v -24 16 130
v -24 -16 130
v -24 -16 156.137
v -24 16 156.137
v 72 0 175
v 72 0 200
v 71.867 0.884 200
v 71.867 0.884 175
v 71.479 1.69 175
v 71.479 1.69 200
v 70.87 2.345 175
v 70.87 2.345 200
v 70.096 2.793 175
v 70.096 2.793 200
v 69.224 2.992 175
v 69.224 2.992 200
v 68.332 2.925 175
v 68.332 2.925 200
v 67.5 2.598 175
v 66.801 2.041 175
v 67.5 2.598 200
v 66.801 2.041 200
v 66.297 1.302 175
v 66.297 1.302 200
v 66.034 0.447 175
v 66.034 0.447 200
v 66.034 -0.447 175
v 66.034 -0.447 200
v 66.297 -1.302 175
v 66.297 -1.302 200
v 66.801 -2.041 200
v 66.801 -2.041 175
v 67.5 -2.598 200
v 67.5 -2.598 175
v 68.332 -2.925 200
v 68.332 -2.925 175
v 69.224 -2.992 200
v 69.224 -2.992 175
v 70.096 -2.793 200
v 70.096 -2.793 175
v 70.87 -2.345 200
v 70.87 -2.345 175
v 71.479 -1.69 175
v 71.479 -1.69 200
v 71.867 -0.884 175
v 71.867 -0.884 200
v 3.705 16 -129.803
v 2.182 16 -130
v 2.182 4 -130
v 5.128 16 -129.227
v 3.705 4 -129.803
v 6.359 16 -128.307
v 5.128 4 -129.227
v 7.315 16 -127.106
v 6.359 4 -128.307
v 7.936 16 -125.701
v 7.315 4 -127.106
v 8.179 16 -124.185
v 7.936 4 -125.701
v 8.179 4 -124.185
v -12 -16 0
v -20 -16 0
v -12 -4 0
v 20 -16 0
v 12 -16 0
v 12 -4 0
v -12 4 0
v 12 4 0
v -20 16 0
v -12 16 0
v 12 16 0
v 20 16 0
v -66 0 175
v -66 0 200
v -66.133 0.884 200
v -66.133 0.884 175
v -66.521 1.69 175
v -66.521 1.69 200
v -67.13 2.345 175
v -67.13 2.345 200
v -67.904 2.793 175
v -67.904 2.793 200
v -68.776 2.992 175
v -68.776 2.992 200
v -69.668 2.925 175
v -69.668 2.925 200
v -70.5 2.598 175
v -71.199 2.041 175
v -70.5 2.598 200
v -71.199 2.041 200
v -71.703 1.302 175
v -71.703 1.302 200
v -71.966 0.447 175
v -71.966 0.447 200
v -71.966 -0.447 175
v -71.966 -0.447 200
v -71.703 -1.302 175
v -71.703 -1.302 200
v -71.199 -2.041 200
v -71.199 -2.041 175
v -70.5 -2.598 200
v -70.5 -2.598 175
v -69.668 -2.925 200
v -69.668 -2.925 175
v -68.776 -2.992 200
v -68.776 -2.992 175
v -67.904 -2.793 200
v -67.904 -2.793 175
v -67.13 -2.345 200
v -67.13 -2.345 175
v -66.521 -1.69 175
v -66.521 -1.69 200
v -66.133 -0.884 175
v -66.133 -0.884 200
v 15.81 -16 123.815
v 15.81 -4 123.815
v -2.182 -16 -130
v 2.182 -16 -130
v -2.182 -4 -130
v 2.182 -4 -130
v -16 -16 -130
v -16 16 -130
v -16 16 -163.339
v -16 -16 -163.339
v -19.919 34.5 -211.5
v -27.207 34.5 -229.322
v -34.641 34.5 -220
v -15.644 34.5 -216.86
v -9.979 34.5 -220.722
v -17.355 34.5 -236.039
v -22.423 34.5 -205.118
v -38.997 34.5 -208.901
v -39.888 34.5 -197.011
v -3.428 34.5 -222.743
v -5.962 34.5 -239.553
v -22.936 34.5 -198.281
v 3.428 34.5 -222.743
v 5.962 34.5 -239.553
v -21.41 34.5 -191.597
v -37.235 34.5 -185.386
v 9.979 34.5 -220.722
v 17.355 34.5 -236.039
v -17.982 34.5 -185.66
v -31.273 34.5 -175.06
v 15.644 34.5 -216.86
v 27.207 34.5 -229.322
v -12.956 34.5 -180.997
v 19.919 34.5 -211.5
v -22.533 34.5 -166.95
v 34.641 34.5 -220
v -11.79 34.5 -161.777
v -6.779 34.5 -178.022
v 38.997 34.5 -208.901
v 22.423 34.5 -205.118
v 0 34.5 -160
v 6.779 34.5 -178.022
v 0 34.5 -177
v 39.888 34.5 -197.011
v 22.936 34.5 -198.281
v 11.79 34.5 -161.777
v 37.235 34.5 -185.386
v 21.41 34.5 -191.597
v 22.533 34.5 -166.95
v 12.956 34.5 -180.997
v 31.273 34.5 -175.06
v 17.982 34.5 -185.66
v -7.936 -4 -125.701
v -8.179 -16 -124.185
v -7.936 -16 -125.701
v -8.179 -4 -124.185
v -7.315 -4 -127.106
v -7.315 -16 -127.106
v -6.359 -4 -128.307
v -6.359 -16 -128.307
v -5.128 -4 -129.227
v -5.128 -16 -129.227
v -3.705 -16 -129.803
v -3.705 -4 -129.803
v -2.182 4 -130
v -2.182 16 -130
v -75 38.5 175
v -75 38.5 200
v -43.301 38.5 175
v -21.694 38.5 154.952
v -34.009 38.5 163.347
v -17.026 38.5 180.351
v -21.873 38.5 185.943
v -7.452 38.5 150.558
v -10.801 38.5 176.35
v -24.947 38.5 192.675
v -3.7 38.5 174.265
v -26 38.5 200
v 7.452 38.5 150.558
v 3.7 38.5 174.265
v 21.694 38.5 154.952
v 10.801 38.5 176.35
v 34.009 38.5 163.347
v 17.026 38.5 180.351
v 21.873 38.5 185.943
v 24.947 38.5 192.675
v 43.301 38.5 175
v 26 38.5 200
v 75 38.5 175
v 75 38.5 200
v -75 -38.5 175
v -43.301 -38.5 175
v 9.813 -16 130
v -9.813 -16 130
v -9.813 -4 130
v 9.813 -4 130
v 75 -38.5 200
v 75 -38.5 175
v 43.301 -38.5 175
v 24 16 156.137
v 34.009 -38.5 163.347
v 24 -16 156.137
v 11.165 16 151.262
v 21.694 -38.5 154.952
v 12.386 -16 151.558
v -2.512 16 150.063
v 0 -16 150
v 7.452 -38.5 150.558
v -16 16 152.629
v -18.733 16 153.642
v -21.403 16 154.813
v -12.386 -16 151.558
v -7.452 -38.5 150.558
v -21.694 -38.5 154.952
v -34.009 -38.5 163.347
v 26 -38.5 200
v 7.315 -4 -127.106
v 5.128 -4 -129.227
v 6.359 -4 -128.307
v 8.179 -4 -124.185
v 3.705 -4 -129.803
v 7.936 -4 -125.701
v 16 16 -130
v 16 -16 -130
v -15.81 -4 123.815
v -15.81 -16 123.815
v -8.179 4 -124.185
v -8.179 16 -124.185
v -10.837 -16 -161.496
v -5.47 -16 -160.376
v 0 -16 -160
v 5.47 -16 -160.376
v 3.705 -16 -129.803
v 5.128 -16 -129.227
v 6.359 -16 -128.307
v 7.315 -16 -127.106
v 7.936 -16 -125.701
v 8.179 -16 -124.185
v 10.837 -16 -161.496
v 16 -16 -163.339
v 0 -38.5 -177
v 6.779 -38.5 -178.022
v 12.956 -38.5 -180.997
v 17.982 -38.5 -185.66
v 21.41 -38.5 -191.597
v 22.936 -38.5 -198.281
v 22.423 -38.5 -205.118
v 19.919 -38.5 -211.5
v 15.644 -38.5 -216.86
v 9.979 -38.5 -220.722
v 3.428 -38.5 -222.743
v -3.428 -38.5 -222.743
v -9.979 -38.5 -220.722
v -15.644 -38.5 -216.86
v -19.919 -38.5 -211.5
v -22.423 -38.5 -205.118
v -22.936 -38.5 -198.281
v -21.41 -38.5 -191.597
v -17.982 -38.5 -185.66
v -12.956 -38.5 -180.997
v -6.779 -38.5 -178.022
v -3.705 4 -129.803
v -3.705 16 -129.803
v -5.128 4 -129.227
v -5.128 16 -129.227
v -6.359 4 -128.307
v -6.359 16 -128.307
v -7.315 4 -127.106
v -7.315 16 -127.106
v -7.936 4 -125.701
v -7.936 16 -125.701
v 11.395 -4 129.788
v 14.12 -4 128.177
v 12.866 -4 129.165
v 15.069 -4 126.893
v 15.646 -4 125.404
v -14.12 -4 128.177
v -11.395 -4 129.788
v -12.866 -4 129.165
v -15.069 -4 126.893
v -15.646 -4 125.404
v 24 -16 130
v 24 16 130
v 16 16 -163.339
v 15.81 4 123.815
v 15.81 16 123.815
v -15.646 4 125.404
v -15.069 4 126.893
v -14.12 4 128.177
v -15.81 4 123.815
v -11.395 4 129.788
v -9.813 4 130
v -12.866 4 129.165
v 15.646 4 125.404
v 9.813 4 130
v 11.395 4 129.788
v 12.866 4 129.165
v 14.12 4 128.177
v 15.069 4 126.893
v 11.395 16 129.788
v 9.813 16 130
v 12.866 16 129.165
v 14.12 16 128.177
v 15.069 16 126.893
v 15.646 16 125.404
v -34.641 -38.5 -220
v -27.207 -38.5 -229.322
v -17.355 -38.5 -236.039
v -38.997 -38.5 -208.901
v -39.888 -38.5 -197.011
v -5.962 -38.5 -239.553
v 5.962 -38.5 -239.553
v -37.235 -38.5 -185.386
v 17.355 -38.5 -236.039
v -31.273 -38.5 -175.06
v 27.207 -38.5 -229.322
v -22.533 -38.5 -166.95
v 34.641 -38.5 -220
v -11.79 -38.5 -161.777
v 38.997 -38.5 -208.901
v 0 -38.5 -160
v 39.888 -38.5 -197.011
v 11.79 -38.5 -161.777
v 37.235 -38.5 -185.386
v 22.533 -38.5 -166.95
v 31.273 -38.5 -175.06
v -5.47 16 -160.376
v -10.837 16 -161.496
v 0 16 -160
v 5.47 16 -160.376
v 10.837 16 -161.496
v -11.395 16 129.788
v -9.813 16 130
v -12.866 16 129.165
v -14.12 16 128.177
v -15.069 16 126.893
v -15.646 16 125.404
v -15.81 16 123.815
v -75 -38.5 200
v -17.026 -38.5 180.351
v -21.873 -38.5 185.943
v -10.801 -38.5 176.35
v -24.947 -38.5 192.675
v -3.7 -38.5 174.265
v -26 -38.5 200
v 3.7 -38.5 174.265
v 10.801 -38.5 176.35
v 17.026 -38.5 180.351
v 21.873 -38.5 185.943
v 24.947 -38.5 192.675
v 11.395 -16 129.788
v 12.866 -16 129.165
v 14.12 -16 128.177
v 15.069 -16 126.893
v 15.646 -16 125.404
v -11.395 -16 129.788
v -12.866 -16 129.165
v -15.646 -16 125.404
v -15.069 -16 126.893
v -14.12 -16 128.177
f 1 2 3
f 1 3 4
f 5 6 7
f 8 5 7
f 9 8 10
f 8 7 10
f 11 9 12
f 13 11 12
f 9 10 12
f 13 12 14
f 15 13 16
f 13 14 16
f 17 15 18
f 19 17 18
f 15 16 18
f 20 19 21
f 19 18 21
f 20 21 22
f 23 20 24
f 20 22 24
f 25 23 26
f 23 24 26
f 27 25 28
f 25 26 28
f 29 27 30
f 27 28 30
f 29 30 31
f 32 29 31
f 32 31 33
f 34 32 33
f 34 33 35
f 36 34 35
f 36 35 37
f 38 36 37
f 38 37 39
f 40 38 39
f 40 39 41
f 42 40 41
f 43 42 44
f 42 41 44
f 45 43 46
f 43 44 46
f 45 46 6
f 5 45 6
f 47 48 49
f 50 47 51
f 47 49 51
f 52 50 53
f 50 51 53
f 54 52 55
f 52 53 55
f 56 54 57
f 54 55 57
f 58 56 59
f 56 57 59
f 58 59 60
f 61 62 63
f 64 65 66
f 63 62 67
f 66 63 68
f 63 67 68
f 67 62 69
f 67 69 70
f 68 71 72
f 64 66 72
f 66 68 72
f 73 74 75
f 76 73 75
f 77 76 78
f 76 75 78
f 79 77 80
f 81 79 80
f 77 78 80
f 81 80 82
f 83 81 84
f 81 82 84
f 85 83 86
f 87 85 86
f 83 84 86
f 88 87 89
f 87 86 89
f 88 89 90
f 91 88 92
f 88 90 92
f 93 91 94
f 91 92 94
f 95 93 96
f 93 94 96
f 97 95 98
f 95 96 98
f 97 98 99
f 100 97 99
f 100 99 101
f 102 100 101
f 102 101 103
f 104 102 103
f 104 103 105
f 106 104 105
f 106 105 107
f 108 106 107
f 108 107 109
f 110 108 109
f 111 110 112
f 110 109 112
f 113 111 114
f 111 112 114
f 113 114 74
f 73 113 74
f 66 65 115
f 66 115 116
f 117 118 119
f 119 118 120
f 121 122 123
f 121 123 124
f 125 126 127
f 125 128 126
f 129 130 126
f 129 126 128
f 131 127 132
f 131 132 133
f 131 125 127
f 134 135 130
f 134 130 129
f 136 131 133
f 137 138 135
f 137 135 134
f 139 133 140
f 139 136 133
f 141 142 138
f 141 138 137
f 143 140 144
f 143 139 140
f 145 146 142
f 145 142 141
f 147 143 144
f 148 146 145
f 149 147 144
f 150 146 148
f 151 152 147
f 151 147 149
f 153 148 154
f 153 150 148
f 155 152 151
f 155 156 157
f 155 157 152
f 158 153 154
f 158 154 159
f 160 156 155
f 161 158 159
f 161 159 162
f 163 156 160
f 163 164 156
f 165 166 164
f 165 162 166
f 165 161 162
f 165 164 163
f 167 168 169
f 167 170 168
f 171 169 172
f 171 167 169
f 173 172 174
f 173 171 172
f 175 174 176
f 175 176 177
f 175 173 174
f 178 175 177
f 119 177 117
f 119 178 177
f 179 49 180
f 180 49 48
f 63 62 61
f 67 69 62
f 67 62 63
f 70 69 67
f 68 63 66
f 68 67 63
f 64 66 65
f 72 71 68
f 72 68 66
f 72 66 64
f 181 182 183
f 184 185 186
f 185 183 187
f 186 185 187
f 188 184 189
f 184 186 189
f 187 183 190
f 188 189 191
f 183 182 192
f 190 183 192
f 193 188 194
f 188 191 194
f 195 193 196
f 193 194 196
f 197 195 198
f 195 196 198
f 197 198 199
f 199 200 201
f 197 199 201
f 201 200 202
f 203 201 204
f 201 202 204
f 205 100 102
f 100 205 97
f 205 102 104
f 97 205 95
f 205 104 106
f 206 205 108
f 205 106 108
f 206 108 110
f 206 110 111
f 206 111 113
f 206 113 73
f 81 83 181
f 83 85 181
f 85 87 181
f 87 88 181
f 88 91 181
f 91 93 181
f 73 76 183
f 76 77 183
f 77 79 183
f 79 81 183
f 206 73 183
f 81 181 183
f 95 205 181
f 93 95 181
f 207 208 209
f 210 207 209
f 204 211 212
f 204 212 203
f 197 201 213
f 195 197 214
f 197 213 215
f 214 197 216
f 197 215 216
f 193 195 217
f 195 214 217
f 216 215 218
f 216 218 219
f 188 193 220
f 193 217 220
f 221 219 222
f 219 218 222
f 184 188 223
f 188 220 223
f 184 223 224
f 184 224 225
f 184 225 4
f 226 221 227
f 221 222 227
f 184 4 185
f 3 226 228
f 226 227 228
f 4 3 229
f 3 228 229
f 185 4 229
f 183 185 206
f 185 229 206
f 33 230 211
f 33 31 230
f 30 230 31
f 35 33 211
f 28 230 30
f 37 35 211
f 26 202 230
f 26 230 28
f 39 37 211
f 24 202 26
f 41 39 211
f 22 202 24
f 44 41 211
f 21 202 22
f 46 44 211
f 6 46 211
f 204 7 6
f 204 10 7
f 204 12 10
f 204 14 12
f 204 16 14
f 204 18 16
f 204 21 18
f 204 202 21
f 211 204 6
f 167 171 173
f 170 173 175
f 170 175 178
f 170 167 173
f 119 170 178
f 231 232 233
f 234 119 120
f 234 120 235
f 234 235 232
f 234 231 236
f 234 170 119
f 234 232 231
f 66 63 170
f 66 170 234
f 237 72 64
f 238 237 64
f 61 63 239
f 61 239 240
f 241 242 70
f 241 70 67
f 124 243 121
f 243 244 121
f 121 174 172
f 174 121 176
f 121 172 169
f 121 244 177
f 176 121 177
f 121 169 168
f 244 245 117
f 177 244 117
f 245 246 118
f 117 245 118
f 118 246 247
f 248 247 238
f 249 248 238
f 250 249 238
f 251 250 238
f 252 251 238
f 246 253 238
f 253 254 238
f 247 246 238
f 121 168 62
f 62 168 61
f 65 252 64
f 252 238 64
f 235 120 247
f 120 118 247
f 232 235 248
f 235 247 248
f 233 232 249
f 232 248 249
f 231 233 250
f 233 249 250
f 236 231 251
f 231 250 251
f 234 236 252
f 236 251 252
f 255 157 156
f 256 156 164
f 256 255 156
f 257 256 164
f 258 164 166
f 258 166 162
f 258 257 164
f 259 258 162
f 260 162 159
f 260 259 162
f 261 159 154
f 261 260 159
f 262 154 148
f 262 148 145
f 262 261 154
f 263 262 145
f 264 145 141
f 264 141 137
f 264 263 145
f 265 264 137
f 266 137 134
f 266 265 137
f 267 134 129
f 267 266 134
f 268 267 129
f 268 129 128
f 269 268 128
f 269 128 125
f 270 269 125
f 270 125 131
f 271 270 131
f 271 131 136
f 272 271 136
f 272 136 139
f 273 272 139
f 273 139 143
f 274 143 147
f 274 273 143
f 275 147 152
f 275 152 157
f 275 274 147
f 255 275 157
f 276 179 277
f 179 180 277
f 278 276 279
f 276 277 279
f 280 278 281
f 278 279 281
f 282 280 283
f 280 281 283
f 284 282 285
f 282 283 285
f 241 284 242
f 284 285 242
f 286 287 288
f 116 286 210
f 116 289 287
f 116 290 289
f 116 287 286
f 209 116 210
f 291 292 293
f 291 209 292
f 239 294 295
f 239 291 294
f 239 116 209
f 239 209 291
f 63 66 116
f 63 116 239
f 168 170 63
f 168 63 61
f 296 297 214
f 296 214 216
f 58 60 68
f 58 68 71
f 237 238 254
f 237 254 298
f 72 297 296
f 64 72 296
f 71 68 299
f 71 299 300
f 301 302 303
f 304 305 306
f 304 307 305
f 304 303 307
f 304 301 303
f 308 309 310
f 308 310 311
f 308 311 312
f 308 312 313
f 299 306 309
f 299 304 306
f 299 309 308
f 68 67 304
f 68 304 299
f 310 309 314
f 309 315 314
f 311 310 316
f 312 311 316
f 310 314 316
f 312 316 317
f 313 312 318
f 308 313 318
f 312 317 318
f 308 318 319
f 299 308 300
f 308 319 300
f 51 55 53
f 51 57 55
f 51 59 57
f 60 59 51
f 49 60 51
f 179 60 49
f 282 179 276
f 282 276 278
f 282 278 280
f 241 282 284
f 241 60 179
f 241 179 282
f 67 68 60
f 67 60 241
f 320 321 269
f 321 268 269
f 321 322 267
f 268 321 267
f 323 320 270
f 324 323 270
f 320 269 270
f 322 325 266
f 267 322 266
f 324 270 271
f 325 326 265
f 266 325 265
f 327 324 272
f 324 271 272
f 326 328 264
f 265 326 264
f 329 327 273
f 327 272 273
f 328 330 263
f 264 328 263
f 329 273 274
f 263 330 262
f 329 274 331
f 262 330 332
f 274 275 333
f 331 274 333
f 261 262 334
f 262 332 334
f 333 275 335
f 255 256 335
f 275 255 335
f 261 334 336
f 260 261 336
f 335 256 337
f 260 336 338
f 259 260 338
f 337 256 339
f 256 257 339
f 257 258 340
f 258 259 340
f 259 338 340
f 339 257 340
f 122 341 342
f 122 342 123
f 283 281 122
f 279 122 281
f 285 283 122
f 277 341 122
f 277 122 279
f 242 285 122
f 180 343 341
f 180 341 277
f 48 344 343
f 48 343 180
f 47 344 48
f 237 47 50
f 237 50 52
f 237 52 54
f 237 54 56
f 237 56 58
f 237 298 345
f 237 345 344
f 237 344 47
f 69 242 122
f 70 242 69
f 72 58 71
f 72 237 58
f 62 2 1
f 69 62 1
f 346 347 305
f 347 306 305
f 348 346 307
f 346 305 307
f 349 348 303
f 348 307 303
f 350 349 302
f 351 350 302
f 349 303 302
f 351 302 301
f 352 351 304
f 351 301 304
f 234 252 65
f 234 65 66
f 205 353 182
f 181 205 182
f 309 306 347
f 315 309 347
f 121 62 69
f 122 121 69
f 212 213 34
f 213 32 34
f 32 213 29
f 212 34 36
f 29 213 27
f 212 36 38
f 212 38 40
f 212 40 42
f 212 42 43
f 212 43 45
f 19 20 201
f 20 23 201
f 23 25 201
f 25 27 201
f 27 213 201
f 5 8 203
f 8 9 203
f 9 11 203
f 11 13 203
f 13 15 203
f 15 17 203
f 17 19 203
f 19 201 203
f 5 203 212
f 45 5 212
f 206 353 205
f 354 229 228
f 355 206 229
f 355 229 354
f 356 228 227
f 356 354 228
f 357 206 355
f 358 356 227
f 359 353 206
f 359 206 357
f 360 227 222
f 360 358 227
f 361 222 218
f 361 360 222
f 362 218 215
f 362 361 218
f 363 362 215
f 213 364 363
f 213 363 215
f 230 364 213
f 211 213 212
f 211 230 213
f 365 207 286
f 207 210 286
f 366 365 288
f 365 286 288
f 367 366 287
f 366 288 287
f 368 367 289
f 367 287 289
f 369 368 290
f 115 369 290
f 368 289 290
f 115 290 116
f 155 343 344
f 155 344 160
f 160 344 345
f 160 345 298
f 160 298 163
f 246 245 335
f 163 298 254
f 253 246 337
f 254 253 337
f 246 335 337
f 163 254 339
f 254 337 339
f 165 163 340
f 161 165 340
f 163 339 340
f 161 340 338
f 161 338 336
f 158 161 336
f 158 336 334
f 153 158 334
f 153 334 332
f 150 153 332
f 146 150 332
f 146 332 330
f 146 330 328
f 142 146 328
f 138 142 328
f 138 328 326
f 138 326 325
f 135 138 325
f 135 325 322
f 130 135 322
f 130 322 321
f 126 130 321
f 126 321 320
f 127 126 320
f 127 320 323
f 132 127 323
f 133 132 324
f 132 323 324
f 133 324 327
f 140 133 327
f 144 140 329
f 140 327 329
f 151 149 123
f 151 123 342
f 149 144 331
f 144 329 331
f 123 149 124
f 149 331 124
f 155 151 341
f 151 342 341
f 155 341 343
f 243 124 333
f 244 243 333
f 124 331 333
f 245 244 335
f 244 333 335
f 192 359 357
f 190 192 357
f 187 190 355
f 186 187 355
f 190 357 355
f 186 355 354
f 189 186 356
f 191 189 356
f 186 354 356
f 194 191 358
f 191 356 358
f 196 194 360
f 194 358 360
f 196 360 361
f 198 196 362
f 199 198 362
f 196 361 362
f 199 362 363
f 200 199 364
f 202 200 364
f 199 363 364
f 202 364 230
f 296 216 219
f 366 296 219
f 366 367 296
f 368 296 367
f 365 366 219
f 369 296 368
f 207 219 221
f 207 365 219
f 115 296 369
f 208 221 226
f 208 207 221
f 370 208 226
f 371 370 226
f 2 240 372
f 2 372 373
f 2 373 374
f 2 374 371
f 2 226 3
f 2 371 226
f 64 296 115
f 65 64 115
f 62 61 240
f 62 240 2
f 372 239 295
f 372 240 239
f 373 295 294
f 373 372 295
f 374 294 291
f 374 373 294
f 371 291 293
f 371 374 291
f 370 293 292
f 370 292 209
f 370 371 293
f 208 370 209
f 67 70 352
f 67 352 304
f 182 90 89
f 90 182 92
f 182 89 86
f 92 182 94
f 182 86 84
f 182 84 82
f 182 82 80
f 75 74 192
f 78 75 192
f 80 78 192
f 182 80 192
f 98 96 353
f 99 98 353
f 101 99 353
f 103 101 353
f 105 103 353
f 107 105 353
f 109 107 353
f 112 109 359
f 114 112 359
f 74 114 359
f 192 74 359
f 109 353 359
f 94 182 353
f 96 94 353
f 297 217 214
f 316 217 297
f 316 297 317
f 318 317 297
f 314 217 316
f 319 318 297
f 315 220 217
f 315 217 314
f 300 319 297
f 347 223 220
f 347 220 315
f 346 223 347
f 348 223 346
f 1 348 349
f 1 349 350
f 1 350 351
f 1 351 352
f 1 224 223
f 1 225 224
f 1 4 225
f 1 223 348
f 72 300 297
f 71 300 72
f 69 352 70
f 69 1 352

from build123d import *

# Parameters (mm, degrees)
BOSS_EXTRUDE1_DEPTH      = 34.5
BOSS_EXTRUDE1_DEPTH_BACK = 38.5
SKETCH1_R                = 40
SKETCH1_R_2              = 23
BOSS_EXTRUDE2_DEPTH      = 38.5
BOSS_EXTRUDE2_DEPTH_BACK = 38.5
BOSS_EXTRUDE4_REACH      = 337.98
BOSS_EXTRUDE4_END_RADIUS = 23
BOSS_EXTRUDE5_REACH      = 377.343
BOSS_EXTRUDE5_END_RADIUS = 26
SKETCH5_W                = 37
SKETCH5_H                = 77
SKETCH5_R                = 3
BOSS_EXTRUDE6_DEPTH      = 25
SKETCH6_W                = 22.629122871
SKETCH6_H                = 12
BOSS_EXTRUDE7_DEPTH      = 36
SKETCH7_W                = 30.808164115
SKETCH7_H                = 12
BOSS_EXTRUDE8_DEPTH      = 21
SKETCH8_W                = 30.808164115
SKETCH8_H                = 12
BOSS_EXTRUDE9_DEPTH      = 21
SKETCH10_W               = 26.136575601
SKETCH10_H               = 32
BOSS_EXTRUDE10_DEPTH     = 46
FILLET4_R                = 6
FILLET5_R                = 6


with BuildPart() as part:
    # Sketch1 → Boss-Extrude1 (new, two sides: drawn at the far end of the back side and taken through both)
    with BuildSketch(Plane(origin=(0, 0, 0), x_dir=(1, 0, 0), z_dir=(0, 1, 0)).offset(-BOSS_EXTRUDE1_DEPTH_BACK)):
        with Locations((0, 200)):
            Circle(SKETCH1_R)
        with Locations((0, 200)):
            Circle(SKETCH1_R_2, mode=Mode.SUBTRACT)
    extrude(amount=BOSS_EXTRUDE1_DEPTH + BOSS_EXTRUDE1_DEPTH_BACK)



with BuildPart() as body_2:
    # Sketch1<6> → Boss-Extrude2 (new, two sides: drawn at the far end of the back side and taken through both)
    with BuildSketch(Plane(origin=(0, 0, 0), x_dir=(1, 0, 0), z_dir=(0, 1, 0)).offset(-BOSS_EXTRUDE2_DEPTH_BACK)):
        with BuildLine():
            ThreePointArc((50, -200), (0, -150), (-50, -200))
            Line((-50, -200), (-26, -200))
            ThreePointArc((-26, -200), (0, -174), (26, -200))
            Line((26, -200), (50, -200))
        make_face()
    extrude(amount=BOSS_EXTRUDE2_DEPTH + BOSS_EXTRUDE2_DEPTH_BACK)



with BuildPart() as body_3:
    # Sketch3 → Loft1 section 0
    with BuildSketch(Plane.XY.offset(130)):
        with BuildLine():
            Line((-24, -16), (-24, 16))
            Line((-24, 16), (-16, 16))
            Line((-16, 16), (-16, 4))
            Line((-16, 4), (16, 4))
            Line((16, 4), (16, 16))
            Line((16, 16), (24, 16))
            Line((24, 16), (24, -16))
            Line((24, -16), (16, -16))
            Line((16, -16), (16, -4))
            Line((16, -4), (-16, -4))
            Line((-16, -4), (-16, -16))
            Line((-16, -16), (-24, -16))
        make_face()
    # Sketch4 → Loft1 section 1
    with BuildSketch(Plane.XY):
        with BuildLine():
            Line((-20, 16), (-12, 16))
            Line((-12, 16), (-12, 4))
            Line((-12, 4), (12, 4))
            Line((12, 4), (12, 16))
            Line((12, 16), (20, 16))
            Line((20, 16), (20, -16))
            Line((20, -16), (12, -16))
            Line((12, -16), (12, -4))
            Line((12, -4), (-12, -4))
            Line((-12, -4), (-12, -16))
            Line((-12, -16), (-20, -16))
            Line((-20, -16), (-20, 16))
        make_face()
    loft()


with BuildPart() as body_4:
    # Sketch4<3> → Loft3 section 0
    with BuildSketch(Plane.XY):
        with BuildLine():
            Line((-20, 16), (-12, 16))
            Line((-12, 16), (-12, 4))
            Line((-12, 4), (12, 4))
            Line((12, 4), (12, 16))
            Line((12, 16), (20, 16))
            Line((20, 16), (20, -16))
            Line((20, -16), (12, -16))
            Line((12, -16), (12, -4))
            Line((12, -4), (-12, -4))
            Line((-12, -4), (-12, -16))
            Line((-12, -16), (-20, -16))
            Line((-20, -16), (-20, 16))
        make_face()
    # Sketch2 → Loft3 section 1
    with BuildSketch(Plane.XY.offset(-130)):
        with BuildLine():
            Line((16, 16), (8, 16))
            Line((8, 16), (8, 4))
            Line((8, 4), (-8, 4))
            Line((-8, 4), (-8, 16))
            Line((-8, 16), (-16, 16))
            Line((-16, 16), (-16, -16))
            Line((-16, -16), (-8, -16))
            Line((-8, -16), (-8, -4))
            Line((-8, -4), (8, -4))
            Line((8, -4), (8, -16))
            Line((8, -16), (16, -16))
            Line((16, -16), (16, 16))
        make_face()
    loft()


with BuildPart() as part_1:
    add(part.part)

    add(body_4.part)  # Boss-Extrude4 merges body 4
    # Boss-Extrude4: up to this cylinder (the profile starts outside it)
    boss_extrude4_end = Plane(origin=(0, 0, -200), z_dir=(0, 1, 0)) * Cylinder(BOSS_EXTRUDE4_END_RADIUS, 722.96, mode=Mode.PRIVATE)
    # Sketch2<8> → Boss-Extrude4 (add, up to the surface)
    with BuildSketch(Plane.XY.offset(-130), mode=Mode.PRIVATE) as boss_extrude4_sk1:
        Polygon((16, 16), (8, 16), (8, 4), (-8, 4), (-8, 16), (-16, 16), (-16, -16), (-8, -16), (-8, -4), (8, -4), (8, -16), (16, -16), align=None)
    boss_extrude4_tool1 = extrude(boss_extrude4_sk1.sketch, amount=-BOSS_EXTRUDE4_REACH, mode=Mode.PRIVATE) - boss_extrude4_end
    add(boss_extrude4_tool1.solids().sort_by_distance((0, 0, -130))[0])

    # Sketch7 → Boss-Extrude8 (add)
    with BuildSketch(Plane.ZY.offset(-8)):
        with Locations((-145.404082058, -10)):
            Rectangle(SKETCH7_W, SKETCH7_H)
    extrude(amount=BOSS_EXTRUDE8_DEPTH)

    # Sketch8 → Boss-Extrude9 (add)
    with BuildSketch(Plane.ZY.offset(-8)):
        with Locations((-145.404082058, 10)):
            Rectangle(SKETCH8_W, SKETCH8_H)
    extrude(amount=BOSS_EXTRUDE9_DEPTH)

    # Fillet4
    fillet4_edges = [part_1.edges().sort_by_distance(p)[0] for p in [
        (8, 10, -130),
        (-8, 10, -130),
        (-8, -10, -130),
        (8, -10, -130),
    ]]
    fillet(fillet4_edges, radius=FILLET4_R)


with BuildPart() as body_2_1:
    add(body_2.part)

    add(body_3.part)  # Boss-Extrude5 merges body 3
    # Boss-Extrude5: up to this cylinder (the profile starts outside it)
    boss_extrude5_end = Plane(origin=(0, 0, 200), z_dir=(0, 1, 0)) * Cylinder(BOSS_EXTRUDE5_END_RADIUS, 807.686, mode=Mode.PRIVATE)
    # Sketch3<3> → Boss-Extrude5 (add, up to the surface)
    with BuildSketch(Plane.XY.offset(130), mode=Mode.PRIVATE) as boss_extrude5_sk1:
        Polygon((-24, -16), (-24, 16), (-16, 16), (-16, 4), (16, 4), (16, 16), (24, 16), (24, -16), (16, -16), (16, -4), (-16, -4), (-16, -16), align=None)
    boss_extrude5_tool1 = extrude(boss_extrude5_sk1.sketch, amount=BOSS_EXTRUDE5_REACH, mode=Mode.PRIVATE) - boss_extrude5_end
    add(boss_extrude5_tool1.solids().sort_by_distance((0, 0, 130))[0])

    # Sketch5 → Boss-Extrude6 (add)
    # profile 1 of 2: a face of its own
    with BuildSketch(Plane.XY.offset(200)):
        with Locations((56.5, 0)):
            Rectangle(SKETCH5_W, SKETCH5_H)
        with Locations((69, 0)):
            Circle(SKETCH5_R, mode=Mode.SUBTRACT)
    # profile 2 of 2: a face of its own
    with BuildSketch(Plane.XY.offset(200)):
        with Locations((-56.5, 0)):
            Rectangle(SKETCH5_W, SKETCH5_H)
        with Locations((-69, 0)):
            Circle(SKETCH5_R, mode=Mode.SUBTRACT)
    extrude(amount=-BOSS_EXTRUDE6_DEPTH)

    # Sketch6 → Boss-Extrude7 (add)
    with BuildSketch(Plane(origin=(-16, 0, 0), x_dir=(0, 0, -1), z_dir=(1, 0, 0))):
        with Locations((-141.314561436, 10)):
            Rectangle(SKETCH6_W, SKETCH6_H)
    extrude(amount=BOSS_EXTRUDE7_DEPTH)

    # Sketch10 → Boss-Extrude10 (add)
    with BuildSketch(Plane.ZY.offset(24)):
        with Locations((143.068287801, 0)):
            Rectangle(SKETCH10_W, SKETCH10_H)
    extrude(amount=-BOSS_EXTRUDE10_DEPTH)

    # Fillet5
    fillet5_edges = [body_2_1.edges().sort_by_distance(p)[0] for p in [
        (-16, -10, 130),
        (16, -10, 130),
        (-16, 10, 130),
        (16, 10, 130),
    ]]
    fillet(fillet5_edges, radius=FILLET5_R)


solid = Compound([part_1.part, body_2_1.part])
